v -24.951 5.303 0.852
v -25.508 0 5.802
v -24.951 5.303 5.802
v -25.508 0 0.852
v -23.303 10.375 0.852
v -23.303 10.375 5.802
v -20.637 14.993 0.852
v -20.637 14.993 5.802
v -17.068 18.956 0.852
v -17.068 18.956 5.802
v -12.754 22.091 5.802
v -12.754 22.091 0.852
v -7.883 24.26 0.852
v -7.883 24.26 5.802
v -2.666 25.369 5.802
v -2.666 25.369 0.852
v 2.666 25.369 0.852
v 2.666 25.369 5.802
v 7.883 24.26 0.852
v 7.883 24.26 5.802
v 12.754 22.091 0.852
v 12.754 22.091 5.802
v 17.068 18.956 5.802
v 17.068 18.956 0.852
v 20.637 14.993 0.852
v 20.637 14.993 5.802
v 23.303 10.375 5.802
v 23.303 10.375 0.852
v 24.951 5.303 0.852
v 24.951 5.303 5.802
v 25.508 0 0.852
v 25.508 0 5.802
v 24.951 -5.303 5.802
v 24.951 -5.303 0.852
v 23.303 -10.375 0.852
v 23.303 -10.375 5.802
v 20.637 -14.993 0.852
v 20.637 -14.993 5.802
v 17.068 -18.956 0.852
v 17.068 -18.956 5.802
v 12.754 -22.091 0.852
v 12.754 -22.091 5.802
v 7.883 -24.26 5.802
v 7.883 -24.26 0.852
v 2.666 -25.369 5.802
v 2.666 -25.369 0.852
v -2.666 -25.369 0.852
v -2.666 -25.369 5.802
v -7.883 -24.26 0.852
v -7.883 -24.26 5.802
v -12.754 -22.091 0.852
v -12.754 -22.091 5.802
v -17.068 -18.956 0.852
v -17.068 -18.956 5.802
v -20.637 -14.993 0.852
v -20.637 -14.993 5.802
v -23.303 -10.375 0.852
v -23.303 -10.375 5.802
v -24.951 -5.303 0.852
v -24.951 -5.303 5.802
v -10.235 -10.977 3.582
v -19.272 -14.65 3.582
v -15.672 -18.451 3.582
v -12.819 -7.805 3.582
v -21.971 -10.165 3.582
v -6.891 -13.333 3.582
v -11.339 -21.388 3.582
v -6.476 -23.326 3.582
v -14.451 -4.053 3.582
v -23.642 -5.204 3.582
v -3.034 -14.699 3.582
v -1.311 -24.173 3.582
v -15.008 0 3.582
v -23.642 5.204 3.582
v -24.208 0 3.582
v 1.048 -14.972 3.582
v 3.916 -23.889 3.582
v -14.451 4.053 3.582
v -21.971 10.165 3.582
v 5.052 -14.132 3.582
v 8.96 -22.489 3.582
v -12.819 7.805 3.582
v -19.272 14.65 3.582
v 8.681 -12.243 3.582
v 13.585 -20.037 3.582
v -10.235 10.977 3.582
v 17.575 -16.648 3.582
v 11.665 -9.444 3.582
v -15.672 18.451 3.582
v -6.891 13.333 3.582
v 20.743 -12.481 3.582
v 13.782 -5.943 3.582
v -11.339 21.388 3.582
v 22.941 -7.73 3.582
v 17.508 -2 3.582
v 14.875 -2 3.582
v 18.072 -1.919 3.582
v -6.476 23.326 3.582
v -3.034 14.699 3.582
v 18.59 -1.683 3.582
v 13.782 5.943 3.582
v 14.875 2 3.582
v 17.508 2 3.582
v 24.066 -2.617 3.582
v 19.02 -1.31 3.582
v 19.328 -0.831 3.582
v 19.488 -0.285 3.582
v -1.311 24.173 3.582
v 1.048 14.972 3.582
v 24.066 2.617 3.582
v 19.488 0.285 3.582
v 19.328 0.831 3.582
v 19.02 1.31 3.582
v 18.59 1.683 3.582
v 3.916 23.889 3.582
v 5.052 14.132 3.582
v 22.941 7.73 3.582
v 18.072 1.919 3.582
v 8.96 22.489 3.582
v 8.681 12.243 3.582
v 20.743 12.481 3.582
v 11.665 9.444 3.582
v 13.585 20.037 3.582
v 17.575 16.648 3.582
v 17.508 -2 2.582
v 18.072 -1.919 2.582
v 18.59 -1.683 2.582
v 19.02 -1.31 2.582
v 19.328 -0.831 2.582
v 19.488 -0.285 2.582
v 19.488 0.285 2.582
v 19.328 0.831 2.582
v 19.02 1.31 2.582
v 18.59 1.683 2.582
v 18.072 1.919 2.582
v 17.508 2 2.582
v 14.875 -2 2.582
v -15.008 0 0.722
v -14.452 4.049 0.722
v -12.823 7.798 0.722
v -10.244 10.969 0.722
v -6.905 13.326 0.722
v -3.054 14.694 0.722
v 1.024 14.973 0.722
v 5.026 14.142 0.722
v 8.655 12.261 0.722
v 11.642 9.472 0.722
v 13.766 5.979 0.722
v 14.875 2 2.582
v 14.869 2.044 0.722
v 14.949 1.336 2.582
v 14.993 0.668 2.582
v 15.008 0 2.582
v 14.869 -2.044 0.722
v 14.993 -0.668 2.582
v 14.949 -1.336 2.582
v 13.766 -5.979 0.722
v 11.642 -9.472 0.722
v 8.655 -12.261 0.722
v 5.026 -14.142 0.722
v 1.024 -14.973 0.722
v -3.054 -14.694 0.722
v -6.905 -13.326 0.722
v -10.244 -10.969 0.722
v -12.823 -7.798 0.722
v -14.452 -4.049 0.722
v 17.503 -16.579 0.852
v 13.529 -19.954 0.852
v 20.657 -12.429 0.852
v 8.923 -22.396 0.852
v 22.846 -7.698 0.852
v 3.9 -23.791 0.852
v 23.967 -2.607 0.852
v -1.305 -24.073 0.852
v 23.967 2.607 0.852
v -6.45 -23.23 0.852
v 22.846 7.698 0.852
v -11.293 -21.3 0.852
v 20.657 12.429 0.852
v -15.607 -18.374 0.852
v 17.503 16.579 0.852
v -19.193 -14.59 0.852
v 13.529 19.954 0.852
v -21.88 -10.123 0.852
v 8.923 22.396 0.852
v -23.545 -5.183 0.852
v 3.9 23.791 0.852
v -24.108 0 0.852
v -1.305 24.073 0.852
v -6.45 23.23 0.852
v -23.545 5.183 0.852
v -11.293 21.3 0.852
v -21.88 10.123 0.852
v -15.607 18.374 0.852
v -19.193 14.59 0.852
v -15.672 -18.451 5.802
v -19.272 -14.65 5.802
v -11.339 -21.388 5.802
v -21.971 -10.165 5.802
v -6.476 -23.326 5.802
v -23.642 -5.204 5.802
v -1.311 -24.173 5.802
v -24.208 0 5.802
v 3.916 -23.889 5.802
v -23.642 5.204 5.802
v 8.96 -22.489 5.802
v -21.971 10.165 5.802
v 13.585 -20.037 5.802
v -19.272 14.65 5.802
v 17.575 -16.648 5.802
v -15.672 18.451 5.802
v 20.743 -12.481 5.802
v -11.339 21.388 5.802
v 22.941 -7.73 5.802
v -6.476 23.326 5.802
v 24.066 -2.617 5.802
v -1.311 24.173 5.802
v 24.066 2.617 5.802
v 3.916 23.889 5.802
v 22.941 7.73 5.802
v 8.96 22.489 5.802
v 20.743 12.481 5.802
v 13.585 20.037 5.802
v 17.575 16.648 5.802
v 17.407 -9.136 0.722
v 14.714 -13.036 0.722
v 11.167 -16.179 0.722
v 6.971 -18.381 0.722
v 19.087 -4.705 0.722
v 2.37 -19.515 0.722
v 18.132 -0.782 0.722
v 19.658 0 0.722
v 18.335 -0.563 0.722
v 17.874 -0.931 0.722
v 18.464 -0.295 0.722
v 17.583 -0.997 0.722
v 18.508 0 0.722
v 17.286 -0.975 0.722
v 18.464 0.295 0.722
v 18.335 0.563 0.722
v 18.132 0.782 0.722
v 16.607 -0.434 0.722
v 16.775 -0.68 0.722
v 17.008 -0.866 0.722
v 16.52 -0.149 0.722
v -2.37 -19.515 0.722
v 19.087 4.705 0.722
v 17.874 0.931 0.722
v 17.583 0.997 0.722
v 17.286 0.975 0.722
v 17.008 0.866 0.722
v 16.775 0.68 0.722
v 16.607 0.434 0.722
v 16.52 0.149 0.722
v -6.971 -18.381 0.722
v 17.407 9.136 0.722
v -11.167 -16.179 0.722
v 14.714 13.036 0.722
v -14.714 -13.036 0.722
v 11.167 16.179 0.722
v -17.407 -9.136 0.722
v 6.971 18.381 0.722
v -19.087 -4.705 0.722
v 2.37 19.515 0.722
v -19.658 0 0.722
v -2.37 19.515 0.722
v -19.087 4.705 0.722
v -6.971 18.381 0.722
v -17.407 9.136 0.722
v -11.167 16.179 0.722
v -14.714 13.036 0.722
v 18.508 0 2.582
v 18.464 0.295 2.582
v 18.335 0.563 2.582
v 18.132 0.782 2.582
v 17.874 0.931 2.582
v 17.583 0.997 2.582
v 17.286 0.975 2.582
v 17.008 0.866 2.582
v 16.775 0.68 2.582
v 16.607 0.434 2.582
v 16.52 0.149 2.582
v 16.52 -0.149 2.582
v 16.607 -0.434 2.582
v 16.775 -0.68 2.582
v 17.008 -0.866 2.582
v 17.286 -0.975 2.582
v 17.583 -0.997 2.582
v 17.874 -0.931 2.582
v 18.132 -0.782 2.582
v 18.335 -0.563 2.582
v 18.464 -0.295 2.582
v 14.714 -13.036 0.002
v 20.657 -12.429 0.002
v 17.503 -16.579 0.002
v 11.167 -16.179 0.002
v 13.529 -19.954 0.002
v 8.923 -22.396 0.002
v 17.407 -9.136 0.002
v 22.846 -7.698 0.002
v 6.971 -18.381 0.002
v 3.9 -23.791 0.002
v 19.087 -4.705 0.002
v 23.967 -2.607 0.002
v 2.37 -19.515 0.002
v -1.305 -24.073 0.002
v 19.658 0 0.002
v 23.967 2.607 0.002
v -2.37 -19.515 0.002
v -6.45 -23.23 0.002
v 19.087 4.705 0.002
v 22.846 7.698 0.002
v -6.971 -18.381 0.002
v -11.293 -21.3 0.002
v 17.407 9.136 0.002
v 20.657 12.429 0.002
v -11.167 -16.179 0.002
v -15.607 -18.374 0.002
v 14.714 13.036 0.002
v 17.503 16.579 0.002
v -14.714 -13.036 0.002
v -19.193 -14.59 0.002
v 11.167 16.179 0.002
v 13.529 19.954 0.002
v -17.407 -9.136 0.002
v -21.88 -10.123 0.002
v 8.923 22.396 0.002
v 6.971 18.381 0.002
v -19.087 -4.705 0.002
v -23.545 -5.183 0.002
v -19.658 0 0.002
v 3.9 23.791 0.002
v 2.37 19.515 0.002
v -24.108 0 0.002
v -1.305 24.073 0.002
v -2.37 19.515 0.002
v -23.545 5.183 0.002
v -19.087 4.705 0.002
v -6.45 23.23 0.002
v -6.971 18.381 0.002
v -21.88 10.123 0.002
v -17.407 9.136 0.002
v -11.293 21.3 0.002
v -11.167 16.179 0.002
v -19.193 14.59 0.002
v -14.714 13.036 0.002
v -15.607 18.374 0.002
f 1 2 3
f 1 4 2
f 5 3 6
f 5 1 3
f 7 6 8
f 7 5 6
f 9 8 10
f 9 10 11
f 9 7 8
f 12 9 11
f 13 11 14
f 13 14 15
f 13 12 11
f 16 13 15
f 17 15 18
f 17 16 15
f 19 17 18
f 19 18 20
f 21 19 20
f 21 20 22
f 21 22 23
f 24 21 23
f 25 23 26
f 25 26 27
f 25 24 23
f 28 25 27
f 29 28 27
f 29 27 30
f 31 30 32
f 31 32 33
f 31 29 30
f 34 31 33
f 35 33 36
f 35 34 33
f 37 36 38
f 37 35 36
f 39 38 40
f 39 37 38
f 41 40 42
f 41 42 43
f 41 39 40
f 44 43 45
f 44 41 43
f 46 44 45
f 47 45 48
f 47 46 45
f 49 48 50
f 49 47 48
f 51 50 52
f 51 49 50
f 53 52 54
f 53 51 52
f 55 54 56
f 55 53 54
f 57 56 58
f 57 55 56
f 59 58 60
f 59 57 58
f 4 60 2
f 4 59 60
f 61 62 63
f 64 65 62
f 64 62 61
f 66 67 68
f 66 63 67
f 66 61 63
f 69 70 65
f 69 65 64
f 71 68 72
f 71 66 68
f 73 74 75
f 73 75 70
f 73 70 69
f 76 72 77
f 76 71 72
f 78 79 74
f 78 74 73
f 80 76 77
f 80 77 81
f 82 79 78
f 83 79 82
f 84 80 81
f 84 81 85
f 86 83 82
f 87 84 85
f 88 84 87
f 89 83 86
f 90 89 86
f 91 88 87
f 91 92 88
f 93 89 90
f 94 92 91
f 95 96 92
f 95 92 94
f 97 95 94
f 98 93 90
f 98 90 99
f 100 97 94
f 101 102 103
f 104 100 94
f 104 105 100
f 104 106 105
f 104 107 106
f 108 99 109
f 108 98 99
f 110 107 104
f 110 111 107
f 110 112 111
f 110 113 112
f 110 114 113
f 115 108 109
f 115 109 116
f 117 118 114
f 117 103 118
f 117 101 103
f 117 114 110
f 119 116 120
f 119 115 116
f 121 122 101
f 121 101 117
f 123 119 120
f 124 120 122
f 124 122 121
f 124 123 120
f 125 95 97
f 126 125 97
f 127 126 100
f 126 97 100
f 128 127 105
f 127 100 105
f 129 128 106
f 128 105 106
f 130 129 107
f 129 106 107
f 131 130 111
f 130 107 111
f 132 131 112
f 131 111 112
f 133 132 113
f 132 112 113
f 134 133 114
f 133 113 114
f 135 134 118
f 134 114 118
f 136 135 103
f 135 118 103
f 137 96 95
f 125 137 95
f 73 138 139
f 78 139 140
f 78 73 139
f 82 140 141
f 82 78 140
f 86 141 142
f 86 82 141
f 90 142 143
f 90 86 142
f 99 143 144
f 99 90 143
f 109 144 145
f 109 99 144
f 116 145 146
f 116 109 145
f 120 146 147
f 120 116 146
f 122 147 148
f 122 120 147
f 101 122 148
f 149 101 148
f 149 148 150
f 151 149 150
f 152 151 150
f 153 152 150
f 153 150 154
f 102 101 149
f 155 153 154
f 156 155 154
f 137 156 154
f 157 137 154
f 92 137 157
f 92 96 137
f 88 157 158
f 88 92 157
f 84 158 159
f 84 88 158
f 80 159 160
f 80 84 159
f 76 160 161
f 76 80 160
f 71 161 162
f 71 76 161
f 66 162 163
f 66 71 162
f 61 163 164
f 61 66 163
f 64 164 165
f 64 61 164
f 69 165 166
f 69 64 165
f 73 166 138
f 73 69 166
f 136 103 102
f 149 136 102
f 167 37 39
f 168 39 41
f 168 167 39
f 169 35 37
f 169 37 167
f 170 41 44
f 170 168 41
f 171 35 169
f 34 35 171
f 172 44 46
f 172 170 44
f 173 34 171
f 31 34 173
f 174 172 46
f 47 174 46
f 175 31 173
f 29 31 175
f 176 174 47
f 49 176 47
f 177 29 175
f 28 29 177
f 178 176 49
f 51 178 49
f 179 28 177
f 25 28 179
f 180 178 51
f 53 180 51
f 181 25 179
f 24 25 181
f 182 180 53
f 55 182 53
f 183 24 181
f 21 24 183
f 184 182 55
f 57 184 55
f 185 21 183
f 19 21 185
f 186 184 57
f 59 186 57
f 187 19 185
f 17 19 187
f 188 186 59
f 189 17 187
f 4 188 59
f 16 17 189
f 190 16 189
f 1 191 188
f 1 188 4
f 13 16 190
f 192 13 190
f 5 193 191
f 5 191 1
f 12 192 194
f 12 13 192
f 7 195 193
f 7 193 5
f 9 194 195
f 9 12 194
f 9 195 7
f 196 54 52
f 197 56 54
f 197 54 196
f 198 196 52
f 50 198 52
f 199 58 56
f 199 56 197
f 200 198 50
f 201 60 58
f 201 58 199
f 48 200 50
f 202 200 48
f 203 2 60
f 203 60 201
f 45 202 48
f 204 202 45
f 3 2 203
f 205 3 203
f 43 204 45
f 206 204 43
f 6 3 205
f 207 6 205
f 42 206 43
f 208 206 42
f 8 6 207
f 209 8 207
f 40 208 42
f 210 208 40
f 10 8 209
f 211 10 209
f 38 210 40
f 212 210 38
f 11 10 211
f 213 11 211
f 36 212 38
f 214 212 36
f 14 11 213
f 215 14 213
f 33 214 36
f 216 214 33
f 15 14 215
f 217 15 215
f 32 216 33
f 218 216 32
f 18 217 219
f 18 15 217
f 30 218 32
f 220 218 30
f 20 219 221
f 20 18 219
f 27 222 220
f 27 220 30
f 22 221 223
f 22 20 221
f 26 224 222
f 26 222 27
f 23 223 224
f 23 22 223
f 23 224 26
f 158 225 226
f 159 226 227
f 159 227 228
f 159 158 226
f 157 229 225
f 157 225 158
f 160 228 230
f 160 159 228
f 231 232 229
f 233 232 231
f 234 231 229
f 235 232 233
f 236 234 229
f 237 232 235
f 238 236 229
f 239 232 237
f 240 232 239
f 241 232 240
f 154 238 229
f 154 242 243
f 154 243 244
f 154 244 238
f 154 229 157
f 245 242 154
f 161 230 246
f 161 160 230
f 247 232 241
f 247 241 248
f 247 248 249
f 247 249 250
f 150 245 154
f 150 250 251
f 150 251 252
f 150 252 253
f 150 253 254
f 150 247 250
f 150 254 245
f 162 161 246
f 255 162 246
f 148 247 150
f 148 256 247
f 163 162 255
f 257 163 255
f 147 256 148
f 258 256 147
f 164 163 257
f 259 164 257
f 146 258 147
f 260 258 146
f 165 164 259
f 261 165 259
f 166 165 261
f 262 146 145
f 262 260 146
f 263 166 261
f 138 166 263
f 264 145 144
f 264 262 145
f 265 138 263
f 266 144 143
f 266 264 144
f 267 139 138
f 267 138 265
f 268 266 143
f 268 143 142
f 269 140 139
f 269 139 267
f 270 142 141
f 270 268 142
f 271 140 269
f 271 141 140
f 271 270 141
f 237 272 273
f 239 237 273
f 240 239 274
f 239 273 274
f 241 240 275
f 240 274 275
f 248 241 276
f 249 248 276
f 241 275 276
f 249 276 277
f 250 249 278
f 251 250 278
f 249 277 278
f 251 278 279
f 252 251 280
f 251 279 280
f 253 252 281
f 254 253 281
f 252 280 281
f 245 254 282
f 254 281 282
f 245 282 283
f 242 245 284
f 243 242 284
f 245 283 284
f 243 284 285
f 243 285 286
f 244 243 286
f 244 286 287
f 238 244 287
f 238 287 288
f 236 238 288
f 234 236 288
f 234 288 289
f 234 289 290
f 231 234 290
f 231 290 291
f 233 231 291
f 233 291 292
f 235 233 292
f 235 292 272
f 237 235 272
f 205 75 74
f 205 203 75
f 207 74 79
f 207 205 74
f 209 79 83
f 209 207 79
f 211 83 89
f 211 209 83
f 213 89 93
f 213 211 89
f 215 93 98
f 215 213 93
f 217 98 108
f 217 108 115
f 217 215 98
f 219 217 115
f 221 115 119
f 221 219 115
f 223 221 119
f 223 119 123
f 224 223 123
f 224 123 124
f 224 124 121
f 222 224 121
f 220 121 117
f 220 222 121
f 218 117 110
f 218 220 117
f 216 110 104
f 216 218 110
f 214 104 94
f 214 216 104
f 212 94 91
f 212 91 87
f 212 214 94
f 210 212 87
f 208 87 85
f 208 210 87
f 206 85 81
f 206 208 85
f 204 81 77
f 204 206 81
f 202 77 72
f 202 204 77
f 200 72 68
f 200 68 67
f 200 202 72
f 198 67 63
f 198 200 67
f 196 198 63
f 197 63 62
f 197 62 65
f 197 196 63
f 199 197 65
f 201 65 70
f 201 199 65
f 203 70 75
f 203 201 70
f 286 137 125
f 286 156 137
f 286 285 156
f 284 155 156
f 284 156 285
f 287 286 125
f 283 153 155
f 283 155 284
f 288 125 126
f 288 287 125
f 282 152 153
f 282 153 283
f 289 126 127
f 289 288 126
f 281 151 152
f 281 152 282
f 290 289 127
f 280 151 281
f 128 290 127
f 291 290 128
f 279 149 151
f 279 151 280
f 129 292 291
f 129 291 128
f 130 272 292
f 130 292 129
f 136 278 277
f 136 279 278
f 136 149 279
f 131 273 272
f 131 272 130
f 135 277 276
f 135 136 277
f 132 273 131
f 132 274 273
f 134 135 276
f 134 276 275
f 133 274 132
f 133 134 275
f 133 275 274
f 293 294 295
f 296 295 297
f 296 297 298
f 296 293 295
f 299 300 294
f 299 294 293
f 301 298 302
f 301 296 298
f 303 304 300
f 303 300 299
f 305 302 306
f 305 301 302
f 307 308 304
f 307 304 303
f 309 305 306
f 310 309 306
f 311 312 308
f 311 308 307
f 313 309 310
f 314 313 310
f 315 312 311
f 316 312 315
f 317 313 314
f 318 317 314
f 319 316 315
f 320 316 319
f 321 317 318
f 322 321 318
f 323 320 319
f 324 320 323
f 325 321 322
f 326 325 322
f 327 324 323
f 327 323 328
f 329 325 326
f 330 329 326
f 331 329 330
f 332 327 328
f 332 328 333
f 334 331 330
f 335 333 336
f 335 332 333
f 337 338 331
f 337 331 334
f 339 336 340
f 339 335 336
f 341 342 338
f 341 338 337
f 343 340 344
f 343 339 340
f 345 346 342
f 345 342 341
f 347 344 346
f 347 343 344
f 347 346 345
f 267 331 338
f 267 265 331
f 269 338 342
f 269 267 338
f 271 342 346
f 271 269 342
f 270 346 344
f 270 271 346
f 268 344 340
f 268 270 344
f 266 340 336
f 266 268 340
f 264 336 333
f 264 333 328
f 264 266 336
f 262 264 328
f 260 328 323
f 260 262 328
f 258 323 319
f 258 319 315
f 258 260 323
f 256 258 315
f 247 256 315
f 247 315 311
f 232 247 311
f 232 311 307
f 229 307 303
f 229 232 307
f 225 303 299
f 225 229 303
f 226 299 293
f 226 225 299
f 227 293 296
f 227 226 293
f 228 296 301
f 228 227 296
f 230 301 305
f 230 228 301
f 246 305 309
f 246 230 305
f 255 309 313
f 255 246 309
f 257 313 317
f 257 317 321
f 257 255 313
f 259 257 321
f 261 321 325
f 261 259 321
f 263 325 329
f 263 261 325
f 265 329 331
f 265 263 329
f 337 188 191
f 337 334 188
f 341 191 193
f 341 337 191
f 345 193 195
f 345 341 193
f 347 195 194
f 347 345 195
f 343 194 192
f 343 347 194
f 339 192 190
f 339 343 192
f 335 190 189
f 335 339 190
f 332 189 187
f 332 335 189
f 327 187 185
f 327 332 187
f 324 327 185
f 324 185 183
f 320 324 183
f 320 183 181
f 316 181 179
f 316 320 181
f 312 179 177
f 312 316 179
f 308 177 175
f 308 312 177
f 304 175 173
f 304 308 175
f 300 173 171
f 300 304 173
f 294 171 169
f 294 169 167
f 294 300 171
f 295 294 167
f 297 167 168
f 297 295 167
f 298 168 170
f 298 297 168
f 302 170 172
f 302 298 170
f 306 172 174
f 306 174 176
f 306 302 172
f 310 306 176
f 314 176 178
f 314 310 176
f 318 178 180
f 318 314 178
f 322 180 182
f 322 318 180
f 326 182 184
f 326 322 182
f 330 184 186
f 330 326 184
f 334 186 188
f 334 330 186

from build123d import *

# Parameters (mm, degrees)
F3_R     = 1
F4_DEPTH = 1
F5_DEPTH = 2.86


with BuildPart() as f2:
    # F0 (on Front) → F2 (revolve)
    with BuildSketch(Plane.XZ):
        Polygon((-24.2083683173, 5.8015905717), (-25.5083683173, 5.8015905717), (-25.5083683173, 0.8515905717), (-24.1083683173, 0.8515905717), (-24.1083683173, 0.0015905717), (-19.6583683173, 0.0015905717), (-19.6583683173, 0.7215905717), (-15.0083683173, 0.7215905717), (-15.0083683173, 3.5815905717), (-24.2083683173, 3.5815905717), align=None)
    revolve(axis=Axis((0, 0, 5), (0, 0, -1)))

    # F3 (on face) → F4 (cut)
    with BuildSketch(Plane.XY.offset(3.5815905717)):
        with BuildLine():
            Line((14.8745124138, -2), (17.5083683173, -2))
            ThreePointArc((17.5083683173, -2), (19.5083683173, 0), (17.5083683173, 2))
            Line((17.5083683173, 2), (14.8745124138, 2))
            ThreePointArc((14.8745124138, 2), (14.9748669509, 1.0022371729), (15.0083683173, 0))
            ThreePointArc((15.0083683173, 0), (14.9748669509, -1.0022371729), (14.8745124138, -2))
        make_face()
        with Locations((17.5083683173, 0)):
            Circle(F3_R, mode=Mode.SUBTRACT)
    extrude(amount=-F4_DEPTH, mode=Mode.SUBTRACT)

    # F3 (on face) → F5 (cut)
    with BuildSketch(Plane.XY.offset(3.5815905717)):
        with Locations((17.5083683173, 0)):
            Circle(F3_R)
    extrude(amount=-F5_DEPTH, mode=Mode.SUBTRACT)


solid = f2.part
